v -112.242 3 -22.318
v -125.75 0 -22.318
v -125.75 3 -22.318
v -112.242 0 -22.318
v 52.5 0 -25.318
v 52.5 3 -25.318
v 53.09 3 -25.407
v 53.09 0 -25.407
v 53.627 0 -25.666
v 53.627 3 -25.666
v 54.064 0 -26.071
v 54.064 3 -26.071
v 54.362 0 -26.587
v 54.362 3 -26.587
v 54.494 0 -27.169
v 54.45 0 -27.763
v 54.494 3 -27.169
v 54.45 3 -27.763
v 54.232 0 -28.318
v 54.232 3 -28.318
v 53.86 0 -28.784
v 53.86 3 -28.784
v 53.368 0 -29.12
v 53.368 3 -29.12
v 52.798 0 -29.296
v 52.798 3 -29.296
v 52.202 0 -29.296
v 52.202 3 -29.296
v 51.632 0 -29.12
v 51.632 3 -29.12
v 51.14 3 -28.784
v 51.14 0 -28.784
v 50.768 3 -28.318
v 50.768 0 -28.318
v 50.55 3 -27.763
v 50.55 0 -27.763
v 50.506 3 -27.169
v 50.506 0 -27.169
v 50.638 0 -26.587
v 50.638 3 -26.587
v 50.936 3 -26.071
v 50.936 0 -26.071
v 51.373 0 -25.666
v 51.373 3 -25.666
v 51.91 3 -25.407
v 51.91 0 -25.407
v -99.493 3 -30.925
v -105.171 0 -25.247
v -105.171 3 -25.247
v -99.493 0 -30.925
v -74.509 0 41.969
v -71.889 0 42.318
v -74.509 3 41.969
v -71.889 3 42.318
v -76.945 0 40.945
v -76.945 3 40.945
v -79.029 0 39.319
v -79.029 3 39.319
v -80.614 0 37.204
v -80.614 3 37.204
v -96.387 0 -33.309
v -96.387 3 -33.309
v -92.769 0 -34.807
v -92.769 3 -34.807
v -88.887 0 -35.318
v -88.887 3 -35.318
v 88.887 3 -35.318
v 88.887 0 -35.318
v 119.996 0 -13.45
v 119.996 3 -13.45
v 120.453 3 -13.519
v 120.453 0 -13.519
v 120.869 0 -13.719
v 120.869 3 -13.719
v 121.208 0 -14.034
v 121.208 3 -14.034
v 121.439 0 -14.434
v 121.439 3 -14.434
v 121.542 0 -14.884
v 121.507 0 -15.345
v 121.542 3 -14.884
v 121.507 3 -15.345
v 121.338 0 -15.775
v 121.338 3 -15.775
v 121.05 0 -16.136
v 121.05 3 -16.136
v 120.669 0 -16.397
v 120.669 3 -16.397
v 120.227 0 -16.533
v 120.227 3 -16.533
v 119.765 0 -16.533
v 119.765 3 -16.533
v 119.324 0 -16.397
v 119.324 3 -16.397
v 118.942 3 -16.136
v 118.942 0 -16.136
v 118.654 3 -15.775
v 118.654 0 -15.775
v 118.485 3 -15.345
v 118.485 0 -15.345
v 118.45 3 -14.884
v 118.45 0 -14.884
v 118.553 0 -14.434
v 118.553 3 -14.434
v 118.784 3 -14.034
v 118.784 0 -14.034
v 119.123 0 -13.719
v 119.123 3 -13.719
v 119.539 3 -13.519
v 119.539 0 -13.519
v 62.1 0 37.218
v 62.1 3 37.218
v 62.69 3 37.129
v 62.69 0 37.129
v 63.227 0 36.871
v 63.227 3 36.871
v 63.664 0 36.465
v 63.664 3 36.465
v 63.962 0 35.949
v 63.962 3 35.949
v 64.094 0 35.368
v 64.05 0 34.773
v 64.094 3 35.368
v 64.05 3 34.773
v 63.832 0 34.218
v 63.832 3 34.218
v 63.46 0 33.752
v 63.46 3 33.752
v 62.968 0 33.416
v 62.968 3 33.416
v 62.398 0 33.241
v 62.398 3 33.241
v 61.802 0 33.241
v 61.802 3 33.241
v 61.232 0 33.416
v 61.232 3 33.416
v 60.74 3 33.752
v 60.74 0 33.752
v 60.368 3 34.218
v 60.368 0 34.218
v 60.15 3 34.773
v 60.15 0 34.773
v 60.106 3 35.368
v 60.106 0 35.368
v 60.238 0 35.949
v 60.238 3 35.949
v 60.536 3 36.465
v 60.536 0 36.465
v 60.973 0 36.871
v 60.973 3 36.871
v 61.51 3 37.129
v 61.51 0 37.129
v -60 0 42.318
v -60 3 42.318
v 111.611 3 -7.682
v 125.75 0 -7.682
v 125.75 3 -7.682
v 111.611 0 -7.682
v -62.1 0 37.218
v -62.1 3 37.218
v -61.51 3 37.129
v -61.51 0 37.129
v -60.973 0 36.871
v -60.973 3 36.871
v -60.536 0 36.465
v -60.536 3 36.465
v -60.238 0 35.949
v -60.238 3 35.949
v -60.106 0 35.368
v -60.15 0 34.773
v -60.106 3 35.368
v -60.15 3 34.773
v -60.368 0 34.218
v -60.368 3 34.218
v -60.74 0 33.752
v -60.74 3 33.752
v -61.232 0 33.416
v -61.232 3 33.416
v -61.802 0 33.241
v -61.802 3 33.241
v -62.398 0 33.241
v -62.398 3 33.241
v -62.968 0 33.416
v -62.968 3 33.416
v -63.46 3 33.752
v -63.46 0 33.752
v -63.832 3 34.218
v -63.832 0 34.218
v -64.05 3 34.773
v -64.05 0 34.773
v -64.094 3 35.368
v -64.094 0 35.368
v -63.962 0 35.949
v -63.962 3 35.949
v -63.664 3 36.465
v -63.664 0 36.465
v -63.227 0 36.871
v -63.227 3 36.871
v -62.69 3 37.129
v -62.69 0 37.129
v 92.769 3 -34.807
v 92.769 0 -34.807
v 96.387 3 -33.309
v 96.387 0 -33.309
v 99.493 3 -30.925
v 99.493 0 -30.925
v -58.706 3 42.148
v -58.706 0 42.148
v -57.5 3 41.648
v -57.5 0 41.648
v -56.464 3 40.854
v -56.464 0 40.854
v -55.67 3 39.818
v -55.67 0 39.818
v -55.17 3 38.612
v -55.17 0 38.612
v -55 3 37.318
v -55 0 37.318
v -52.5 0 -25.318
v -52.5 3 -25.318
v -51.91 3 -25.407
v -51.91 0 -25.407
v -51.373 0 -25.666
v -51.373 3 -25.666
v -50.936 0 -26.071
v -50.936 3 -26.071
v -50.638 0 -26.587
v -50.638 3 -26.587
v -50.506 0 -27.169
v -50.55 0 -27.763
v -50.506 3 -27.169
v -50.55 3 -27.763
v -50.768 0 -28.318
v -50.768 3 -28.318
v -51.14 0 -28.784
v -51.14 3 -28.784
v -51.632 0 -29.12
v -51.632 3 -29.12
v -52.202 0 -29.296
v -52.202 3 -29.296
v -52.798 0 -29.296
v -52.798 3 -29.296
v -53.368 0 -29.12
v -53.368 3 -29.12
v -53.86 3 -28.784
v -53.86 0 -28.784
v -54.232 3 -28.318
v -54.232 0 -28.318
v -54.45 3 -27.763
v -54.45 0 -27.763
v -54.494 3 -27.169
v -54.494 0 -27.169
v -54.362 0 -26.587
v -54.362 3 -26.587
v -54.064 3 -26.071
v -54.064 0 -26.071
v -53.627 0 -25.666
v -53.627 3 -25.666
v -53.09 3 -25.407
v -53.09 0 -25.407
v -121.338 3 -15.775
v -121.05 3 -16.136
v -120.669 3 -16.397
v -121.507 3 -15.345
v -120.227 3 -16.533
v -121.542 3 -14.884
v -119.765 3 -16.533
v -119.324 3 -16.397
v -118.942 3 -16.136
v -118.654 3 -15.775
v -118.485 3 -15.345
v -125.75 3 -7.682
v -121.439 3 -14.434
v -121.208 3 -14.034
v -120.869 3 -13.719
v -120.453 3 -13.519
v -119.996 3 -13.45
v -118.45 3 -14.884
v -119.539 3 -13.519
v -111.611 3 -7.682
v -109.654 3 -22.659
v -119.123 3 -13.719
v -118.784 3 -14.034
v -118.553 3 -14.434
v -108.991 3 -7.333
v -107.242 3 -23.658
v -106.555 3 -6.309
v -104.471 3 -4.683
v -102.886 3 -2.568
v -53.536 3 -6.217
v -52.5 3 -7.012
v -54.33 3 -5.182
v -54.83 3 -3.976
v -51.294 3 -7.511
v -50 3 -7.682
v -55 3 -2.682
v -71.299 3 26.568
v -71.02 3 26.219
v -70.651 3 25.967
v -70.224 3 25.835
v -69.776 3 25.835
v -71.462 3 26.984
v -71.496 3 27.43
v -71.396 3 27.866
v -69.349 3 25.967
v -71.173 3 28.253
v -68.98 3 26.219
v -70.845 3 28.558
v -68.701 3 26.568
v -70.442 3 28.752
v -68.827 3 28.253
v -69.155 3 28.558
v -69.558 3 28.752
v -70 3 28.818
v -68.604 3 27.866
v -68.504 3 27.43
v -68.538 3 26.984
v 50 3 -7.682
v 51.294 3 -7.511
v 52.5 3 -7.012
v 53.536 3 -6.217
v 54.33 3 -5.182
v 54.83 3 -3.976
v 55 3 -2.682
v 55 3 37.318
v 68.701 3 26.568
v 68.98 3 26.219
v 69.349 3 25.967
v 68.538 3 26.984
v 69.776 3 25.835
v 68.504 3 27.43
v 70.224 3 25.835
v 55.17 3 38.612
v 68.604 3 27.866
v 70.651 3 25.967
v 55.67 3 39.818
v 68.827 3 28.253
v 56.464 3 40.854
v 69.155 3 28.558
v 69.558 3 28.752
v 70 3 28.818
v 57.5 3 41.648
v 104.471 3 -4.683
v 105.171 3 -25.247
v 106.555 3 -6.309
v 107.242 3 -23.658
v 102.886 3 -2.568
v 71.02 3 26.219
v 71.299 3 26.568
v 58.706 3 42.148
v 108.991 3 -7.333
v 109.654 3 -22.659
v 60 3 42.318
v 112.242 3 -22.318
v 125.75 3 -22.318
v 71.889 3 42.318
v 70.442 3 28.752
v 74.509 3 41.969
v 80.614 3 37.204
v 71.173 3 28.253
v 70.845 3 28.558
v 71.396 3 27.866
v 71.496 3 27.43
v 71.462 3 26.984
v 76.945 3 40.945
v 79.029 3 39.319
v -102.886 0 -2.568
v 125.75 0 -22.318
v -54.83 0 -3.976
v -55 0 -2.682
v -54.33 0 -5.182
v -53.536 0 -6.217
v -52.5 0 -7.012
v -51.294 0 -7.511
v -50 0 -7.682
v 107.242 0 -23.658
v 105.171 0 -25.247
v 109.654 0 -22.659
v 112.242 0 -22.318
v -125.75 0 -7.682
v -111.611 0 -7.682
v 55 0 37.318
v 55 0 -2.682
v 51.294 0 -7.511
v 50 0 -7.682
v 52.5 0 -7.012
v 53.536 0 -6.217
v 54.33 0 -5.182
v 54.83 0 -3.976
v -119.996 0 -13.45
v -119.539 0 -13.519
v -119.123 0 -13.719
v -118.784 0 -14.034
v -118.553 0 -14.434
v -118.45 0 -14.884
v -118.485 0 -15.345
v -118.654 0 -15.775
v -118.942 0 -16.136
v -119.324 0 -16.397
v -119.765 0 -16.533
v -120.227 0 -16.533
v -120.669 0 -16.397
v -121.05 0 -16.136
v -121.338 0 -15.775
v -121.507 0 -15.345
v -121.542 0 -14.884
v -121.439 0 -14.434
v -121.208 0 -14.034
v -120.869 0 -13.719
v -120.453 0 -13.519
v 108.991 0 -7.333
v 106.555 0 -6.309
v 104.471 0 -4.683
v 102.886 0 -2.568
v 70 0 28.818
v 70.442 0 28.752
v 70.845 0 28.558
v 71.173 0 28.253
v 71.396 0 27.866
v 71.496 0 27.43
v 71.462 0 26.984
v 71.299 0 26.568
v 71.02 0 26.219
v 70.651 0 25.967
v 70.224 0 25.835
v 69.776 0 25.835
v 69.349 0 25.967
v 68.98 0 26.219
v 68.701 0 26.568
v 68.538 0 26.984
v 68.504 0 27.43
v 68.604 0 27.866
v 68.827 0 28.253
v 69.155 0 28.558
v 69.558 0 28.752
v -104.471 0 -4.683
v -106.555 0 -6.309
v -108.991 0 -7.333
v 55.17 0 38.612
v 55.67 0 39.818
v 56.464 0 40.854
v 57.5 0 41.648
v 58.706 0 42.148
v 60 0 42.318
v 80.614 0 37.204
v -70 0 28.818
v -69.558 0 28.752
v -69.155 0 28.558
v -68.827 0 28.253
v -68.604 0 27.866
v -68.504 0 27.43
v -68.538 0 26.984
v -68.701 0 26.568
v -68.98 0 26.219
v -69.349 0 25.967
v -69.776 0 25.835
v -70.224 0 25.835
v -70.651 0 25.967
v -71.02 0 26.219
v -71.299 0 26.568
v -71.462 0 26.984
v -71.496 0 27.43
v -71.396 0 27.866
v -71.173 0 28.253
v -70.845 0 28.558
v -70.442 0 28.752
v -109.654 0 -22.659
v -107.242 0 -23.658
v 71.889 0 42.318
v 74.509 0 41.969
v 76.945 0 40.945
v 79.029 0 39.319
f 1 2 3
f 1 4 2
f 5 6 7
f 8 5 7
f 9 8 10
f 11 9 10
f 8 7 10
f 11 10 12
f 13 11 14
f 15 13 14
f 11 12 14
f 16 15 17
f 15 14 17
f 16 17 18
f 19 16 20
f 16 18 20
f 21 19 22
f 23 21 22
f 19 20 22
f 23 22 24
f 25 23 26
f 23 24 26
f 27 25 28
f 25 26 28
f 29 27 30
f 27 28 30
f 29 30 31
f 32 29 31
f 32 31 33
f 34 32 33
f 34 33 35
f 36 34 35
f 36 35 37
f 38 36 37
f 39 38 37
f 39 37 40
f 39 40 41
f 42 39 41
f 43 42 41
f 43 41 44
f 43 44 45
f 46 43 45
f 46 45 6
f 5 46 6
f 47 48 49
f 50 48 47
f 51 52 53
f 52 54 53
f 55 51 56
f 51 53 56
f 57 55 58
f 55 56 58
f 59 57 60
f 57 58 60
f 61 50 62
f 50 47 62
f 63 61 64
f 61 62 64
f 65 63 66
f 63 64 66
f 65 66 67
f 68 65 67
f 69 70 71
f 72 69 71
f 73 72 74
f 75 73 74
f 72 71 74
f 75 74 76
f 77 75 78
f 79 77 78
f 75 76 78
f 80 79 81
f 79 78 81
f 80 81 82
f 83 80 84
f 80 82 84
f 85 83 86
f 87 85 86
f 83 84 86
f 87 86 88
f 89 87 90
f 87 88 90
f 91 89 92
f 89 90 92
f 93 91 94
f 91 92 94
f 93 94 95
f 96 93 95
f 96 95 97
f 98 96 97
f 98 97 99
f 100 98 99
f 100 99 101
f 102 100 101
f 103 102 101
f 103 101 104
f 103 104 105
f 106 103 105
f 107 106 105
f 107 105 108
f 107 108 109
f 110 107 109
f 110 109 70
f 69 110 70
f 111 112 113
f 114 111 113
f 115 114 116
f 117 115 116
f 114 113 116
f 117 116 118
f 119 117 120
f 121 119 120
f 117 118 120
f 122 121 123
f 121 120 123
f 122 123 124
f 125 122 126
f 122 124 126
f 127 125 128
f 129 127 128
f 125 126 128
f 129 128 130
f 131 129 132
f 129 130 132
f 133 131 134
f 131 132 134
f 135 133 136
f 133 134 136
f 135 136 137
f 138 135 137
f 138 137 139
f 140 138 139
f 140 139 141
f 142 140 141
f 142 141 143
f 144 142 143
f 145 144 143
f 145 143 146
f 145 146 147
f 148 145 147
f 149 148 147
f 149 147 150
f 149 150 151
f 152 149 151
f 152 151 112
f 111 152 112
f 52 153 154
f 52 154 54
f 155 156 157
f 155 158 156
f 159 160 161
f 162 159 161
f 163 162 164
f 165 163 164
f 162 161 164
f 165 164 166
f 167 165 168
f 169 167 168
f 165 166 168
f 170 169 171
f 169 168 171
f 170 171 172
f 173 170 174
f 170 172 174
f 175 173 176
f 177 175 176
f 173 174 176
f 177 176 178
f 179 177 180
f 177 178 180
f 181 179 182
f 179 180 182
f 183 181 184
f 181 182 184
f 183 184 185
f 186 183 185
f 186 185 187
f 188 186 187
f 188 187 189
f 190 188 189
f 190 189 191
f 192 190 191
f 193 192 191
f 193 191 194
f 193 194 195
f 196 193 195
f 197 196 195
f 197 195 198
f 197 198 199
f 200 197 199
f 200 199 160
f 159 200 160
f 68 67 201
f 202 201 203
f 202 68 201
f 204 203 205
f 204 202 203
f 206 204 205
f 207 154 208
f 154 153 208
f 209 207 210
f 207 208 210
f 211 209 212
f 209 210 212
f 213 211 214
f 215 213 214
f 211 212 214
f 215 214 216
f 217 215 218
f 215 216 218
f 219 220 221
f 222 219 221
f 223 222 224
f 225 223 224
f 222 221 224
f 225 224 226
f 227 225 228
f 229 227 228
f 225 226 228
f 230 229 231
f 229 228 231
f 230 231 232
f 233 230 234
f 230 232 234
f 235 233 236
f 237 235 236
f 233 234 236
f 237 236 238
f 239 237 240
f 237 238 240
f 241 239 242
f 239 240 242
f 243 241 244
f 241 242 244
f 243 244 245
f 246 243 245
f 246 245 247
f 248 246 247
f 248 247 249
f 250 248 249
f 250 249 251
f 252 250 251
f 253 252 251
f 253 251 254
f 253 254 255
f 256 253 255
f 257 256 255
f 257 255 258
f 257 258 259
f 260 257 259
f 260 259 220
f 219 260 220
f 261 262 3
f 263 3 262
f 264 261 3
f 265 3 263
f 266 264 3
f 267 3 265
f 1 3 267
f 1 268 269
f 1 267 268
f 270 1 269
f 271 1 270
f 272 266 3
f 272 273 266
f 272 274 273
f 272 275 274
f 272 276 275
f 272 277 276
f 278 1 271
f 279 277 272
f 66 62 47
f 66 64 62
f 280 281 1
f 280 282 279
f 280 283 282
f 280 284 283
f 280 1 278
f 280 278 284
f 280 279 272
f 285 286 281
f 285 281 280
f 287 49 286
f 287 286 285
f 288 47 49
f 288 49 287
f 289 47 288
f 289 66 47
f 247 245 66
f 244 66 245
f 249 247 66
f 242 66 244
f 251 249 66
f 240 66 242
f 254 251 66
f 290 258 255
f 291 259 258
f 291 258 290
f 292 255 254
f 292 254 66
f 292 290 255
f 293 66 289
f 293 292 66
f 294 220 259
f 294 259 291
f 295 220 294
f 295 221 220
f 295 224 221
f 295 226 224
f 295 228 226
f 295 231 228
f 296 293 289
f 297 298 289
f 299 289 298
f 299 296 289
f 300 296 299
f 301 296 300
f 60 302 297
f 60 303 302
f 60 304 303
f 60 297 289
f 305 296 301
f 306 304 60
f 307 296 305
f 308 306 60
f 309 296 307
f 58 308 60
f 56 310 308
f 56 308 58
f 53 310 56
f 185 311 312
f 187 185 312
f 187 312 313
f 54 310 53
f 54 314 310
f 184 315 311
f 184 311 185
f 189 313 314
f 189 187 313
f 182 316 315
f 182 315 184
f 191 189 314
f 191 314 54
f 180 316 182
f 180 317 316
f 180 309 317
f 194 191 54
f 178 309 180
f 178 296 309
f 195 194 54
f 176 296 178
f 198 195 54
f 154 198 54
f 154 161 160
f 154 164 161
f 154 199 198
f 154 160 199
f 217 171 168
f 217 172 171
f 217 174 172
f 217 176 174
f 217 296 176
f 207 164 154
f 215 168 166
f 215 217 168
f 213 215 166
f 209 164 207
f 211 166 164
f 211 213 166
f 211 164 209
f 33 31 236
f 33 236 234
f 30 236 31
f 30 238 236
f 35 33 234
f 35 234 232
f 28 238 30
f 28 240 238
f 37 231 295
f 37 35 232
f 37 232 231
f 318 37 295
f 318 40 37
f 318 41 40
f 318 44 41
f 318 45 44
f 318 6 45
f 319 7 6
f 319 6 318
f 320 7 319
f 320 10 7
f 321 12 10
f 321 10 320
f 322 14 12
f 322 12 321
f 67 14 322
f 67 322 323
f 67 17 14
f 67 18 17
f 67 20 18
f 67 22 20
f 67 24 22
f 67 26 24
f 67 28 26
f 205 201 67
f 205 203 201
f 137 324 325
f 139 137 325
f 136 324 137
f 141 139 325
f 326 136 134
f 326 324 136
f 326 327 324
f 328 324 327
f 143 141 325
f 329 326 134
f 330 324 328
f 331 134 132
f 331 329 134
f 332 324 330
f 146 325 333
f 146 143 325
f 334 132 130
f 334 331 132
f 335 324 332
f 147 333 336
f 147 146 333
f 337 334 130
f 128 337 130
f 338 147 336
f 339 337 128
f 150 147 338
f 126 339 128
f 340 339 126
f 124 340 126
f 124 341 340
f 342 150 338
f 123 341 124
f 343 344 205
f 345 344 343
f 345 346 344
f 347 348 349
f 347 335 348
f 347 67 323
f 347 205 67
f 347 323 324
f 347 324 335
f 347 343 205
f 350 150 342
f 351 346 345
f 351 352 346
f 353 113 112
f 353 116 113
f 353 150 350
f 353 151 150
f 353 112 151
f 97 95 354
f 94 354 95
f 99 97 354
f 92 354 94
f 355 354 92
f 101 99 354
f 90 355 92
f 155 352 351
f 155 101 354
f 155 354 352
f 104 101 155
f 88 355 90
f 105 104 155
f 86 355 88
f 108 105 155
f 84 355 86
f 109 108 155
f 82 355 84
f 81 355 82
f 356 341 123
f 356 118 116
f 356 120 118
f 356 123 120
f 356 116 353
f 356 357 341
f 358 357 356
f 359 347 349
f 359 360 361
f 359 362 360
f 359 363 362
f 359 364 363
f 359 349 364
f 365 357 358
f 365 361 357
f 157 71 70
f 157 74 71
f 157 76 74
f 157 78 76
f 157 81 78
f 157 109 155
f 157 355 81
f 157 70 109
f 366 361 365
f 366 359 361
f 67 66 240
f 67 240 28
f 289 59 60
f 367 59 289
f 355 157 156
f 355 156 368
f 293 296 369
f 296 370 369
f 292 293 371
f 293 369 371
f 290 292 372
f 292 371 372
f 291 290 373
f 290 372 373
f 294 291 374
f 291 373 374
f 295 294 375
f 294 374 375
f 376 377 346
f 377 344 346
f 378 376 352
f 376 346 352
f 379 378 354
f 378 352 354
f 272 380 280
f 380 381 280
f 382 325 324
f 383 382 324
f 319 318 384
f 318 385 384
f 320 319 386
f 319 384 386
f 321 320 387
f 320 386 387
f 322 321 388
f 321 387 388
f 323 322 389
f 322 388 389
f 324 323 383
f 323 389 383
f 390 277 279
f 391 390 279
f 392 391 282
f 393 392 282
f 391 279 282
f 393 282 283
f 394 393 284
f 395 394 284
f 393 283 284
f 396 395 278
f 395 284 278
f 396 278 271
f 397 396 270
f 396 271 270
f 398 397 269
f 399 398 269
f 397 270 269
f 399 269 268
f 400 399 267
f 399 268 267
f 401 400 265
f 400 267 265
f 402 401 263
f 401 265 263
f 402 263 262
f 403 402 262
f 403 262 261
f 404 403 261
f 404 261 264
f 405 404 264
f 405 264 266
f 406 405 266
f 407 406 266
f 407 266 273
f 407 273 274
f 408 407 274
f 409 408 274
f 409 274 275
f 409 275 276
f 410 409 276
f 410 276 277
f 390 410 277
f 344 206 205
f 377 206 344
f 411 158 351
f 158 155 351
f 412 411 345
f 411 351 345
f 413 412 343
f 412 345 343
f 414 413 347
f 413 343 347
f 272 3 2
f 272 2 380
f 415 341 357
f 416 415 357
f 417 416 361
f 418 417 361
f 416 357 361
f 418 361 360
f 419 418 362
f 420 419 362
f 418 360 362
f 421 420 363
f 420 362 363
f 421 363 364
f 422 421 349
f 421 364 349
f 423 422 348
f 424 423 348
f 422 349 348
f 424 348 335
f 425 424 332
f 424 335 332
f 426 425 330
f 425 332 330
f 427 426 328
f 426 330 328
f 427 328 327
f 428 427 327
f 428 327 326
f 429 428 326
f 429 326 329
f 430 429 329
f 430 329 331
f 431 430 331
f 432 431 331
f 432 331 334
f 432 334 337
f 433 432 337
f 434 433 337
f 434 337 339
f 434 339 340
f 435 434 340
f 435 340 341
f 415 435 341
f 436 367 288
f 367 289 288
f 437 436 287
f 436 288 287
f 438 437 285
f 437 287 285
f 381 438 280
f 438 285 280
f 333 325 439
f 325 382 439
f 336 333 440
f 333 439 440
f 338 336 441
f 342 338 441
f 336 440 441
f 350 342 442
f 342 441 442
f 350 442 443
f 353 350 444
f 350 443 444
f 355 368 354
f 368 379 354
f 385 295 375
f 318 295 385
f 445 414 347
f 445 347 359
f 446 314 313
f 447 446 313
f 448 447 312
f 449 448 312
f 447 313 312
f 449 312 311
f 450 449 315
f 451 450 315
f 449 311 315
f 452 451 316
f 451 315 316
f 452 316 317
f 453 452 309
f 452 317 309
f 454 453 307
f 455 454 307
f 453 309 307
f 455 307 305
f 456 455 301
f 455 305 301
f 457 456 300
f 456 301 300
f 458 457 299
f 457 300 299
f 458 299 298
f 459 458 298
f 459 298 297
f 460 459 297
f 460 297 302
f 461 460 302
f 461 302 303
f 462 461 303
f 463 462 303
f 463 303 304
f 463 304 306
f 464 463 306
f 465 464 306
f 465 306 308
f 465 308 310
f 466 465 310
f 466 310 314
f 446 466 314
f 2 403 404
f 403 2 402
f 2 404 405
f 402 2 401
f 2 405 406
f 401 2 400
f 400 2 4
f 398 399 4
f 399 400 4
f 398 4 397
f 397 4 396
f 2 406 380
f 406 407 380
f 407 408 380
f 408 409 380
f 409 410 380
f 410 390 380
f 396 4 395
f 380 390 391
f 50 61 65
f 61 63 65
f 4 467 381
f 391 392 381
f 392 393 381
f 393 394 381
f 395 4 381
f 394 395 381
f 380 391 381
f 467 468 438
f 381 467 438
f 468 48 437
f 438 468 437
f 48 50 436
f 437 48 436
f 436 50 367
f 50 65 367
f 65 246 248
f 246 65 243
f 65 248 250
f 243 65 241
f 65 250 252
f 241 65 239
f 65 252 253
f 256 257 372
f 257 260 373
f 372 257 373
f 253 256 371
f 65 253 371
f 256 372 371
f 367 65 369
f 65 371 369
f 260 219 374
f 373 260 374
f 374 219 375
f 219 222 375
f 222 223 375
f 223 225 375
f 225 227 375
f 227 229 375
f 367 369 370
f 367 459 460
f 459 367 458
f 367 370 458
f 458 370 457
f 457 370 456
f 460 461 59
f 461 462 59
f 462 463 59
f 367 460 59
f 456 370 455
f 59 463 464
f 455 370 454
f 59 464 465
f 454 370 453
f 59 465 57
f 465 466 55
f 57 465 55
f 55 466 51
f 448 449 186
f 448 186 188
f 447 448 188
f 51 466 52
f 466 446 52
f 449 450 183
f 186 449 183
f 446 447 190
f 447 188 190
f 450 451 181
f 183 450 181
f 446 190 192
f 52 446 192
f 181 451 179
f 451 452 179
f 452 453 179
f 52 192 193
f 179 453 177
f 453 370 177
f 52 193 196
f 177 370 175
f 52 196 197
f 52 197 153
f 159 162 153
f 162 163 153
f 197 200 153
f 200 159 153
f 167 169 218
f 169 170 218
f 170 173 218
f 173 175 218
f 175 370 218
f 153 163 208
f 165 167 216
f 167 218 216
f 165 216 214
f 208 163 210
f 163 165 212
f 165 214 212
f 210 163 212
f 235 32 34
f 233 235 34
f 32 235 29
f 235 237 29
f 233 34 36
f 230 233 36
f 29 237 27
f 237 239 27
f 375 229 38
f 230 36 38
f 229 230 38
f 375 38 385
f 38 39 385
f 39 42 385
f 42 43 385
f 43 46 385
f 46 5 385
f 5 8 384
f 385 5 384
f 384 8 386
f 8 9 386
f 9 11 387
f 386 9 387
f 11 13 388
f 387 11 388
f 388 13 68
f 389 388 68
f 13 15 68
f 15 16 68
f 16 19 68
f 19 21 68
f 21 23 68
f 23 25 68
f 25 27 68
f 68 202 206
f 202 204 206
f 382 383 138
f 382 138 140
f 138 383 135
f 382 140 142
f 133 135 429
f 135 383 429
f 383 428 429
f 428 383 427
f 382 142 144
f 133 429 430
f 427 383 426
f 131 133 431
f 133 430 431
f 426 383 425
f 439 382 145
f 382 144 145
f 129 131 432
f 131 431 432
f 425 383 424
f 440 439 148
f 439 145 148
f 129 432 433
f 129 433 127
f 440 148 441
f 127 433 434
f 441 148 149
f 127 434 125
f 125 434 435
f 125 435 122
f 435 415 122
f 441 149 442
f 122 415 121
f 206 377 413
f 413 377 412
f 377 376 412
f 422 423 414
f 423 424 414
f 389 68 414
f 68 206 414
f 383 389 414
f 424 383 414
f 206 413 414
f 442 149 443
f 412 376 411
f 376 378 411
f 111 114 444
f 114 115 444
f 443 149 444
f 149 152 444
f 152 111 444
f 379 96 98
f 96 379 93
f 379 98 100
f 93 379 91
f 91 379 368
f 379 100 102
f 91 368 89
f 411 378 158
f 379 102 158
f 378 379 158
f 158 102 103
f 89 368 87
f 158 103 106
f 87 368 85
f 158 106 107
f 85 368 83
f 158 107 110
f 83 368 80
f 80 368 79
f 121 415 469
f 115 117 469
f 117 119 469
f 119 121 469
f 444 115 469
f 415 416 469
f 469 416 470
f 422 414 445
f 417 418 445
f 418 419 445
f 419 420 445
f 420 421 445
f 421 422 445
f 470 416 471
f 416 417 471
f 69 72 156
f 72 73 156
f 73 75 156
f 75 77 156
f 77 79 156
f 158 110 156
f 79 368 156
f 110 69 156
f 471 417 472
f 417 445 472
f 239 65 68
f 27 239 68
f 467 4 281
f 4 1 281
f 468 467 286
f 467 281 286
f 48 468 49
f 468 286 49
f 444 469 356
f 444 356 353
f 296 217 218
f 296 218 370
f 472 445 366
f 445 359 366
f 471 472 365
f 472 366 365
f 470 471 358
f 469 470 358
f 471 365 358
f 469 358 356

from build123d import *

# Parameters (mm, degrees)
SALIENTE_EXTRUIR1_DEPTH = 3
REDONDEO1_R             = 10
CROQUIS2_R              = 1.5
CROQUIS2_R_2            = 1.55
CORTAR_EXTRUIR1_DEPTH   = 135.610141171
CROQUIS4_W              = 110
CROQUIS4_H              = 50
CORTAR_EXTRUIR2_DEPTH   = 135.610141171
REDONDEO2_R             = 5
CROQUIS5_W              = 4
CROQUIS5_H              = 14.636342218
CORTAR_EXTRUIR3_DEPTH   = 135.610141171
CROQUIS6_W              = 14.636342218
CROQUIS6_H              = 3
SALIENTE_EXTRUIR2_DEPTH = 2
CROQUIS8_W              = 14.636342218
CROQUIS8_H              = 3
SALIENTE_EXTRUIR3_DEPTH = 2
CROQUIS9_W              = 196.2
CROQUIS9_H              = 31.087527503
CORTAR_EXTRUIR4_DEPTH   = 133.713564137
CROQUIS10_R             = 2
CORTAR_EXTRUIR5_DEPTH   = 133.713564137
REDONDEO6_R             = 15
CROQUIS11_R             = 2
CORTAR_EXTRUIR6_DEPTH   = 10


with BuildPart() as part:
    # Croquis1 → Saliente-Extruir1 (new body)
    with BuildSketch(Plane(origin=(0, 0, 0), x_dir=(1, 0, 0), z_dir=(0, 1, 0))):
        Polygon((-88.1, 42.318171109), (88.1, 42.318171109), (108.1, 22.318171109), (127.75, 22.318171109), (127.75, 7.681828891), (105.75, 7.681828891), (77.75, -42.318171109), (-77.75, -42.318171109), (-105.75, 7.681828891), (-127.75, 7.681828891), (-127.75, 22.318171109), (-108.1, 22.318171109), align=None)
    extrude(amount=SALIENTE_EXTRUIR1_DEPTH)

    # Redondeo1
    redondeo1_edges = [part.edges().sort_by_distance(p)[0] for p in [
        (-88.1, 1.5, -42.318171109),
        (88.1, 1.5, -42.318171109),
        (108.1, 1.5, -22.318171109),
        (105.75, 1.5, -7.681828891),
        (77.75, 1.5, 42.318171109),
        (-77.75, 1.5, 42.318171109),
        (-105.75, 1.5, -7.681828891),
        (-108.1, 1.5, -22.318171109),
    ]]
    fillet(redondeo1_edges, radius=REDONDEO1_R)

    # Croquis2 → Cortar-Extruir1 (cut, through all)
    with BuildSketch(Plane(origin=(0, 3, 0), x_dir=(1, 0, 0), z_dir=(0, 1, 0))):
        with Locations(Location((70, -27.318171109, 0), (0, 0, 270))):
            Circle(CROQUIS2_R)
        with Locations(Location((-70, -27.318171109, 0), (0, 0, 270))):
            Circle(CROQUIS2_R)
        with Locations(Location((-119.996067812, 15, 0), (0, 0, 270))):
            Circle(CROQUIS2_R_2)
        with Locations(Location((119.996067812, 15, 0), (0, 0, 270))):
            Circle(CROQUIS2_R_2)
        with Locations(Location((-17.5, -17.318171109, 0), (0, 0, 270))):
            Circle(CROQUIS2_R)
        with Locations(Location((17.5, -17.318171109, 0), (0, 0, 270))):
            Circle(CROQUIS2_R)
        with Locations(Location((-17.5, -37.318171109, 0), (0, 0, 270))):
            Circle(CROQUIS2_R)
        with Locations(Location((17.5, -37.318171109, 0), (0, 0, 270))):
            Circle(CROQUIS2_R)
    extrude(amount=-CORTAR_EXTRUIR1_DEPTH, mode=Mode.SUBTRACT)

    # Croquis4 → Cortar-Extruir2 (cut, through all)
    with BuildSketch(Plane(origin=(0, 3, 0), x_dir=(1, 0, 0), z_dir=(0, 1, 0))):
        with Locations((0, -17.318171109)):
            Rectangle(CROQUIS4_W, CROQUIS4_H)
    extrude(amount=-CORTAR_EXTRUIR2_DEPTH, mode=Mode.SUBTRACT)

    # Redondeo2
    redondeo2_edges = [part.edges().sort_by_distance(p)[0] for p in [
        (55, 1.5, 42.318171109),
        (-55, 1.5, 42.318171109),
        (-55, 1.5, -7.681828891),
        (55, 1.5, -7.681828891),
    ]]
    fillet(redondeo2_edges, radius=REDONDEO2_R)

    # Croquis5 → Cortar-Extruir3 (cut, through all)
    with BuildSketch(Plane(origin=(0, 3, 0), x_dir=(1, 0, 0), z_dir=(0, 1, 0))):
        with Locations((-125.75, 15)):
            Rectangle(CROQUIS5_W, CROQUIS5_H)
        with Locations((125.75, 15)):
            Rectangle(CROQUIS5_W, CROQUIS5_H)
    extrude(amount=-CORTAR_EXTRUIR3_DEPTH, mode=Mode.SUBTRACT)

    # Croquis6 → Saliente-Extruir2 (add)
    with BuildSketch(Plane(origin=(123.75, 0, 0), x_dir=(0, 0, -1), z_dir=(1, 0, 0))):
        with Locations((15, 1.5)):
            Rectangle(CROQUIS6_W, CROQUIS6_H)
    extrude(amount=SALIENTE_EXTRUIR2_DEPTH)

    # Croquis8 → Saliente-Extruir3 (add)
    with BuildSketch(Plane.ZY.offset(123.75)):
        with Locations((-15, 1.5)):
            Rectangle(CROQUIS8_W, CROQUIS8_H)
    extrude(amount=SALIENTE_EXTRUIR3_DEPTH)

    # Croquis9 → Cortar-Extruir4 (cut, through all)
    with BuildSketch(Plane(origin=(0, 3, 0), x_dir=(1, 0, 0), z_dir=(0, 1, 0))):
        with Locations((0, 50.861934861)):
            Rectangle(CROQUIS9_W, CROQUIS9_H)
    extrude(amount=-CORTAR_EXTRUIR4_DEPTH, mode=Mode.SUBTRACT)

    # Croquis10 → Cortar-Extruir5 (cut, through all)
    with BuildSketch(Plane(origin=(0, 3, 0), x_dir=(1, 0, 0), z_dir=(0, 1, 0))):
        with Locations(Location((-52.5, 27.318171109, 0), (0, 0, 270))):
            Circle(CROQUIS10_R)
        with Locations(Location((52.5, 27.318171109, 0), (0, 0, 270))):
            Circle(CROQUIS10_R)
    extrude(amount=-CORTAR_EXTRUIR5_DEPTH, mode=Mode.SUBTRACT)

    # Redondeo6
    redondeo6_edges = [part.edges().sort_by_distance(p)[0] for p in [
        (-95.1, 1.5, -35.318171109),
        (95.1, 1.5, -35.318171109),
    ]]
    fillet(redondeo6_edges, radius=REDONDEO6_R)

    # Croquis11 → Cortar-Extruir6 (cut)
    with BuildSketch(Plane(origin=(0, 3, 0), x_dir=(1, 0, 0), z_dir=(0, 1, 0))):
        with Locations(Location((-62.1, -35.218171109, 0), (0, 0, 270))):
            Circle(CROQUIS11_R)
        with Locations(Location((62.1, -35.218171109, 0), (0, 0, 270))):
            Circle(CROQUIS11_R)
    extrude(amount=-CORTAR_EXTRUIR6_DEPTH, mode=Mode.SUBTRACT)


solid = part.part
